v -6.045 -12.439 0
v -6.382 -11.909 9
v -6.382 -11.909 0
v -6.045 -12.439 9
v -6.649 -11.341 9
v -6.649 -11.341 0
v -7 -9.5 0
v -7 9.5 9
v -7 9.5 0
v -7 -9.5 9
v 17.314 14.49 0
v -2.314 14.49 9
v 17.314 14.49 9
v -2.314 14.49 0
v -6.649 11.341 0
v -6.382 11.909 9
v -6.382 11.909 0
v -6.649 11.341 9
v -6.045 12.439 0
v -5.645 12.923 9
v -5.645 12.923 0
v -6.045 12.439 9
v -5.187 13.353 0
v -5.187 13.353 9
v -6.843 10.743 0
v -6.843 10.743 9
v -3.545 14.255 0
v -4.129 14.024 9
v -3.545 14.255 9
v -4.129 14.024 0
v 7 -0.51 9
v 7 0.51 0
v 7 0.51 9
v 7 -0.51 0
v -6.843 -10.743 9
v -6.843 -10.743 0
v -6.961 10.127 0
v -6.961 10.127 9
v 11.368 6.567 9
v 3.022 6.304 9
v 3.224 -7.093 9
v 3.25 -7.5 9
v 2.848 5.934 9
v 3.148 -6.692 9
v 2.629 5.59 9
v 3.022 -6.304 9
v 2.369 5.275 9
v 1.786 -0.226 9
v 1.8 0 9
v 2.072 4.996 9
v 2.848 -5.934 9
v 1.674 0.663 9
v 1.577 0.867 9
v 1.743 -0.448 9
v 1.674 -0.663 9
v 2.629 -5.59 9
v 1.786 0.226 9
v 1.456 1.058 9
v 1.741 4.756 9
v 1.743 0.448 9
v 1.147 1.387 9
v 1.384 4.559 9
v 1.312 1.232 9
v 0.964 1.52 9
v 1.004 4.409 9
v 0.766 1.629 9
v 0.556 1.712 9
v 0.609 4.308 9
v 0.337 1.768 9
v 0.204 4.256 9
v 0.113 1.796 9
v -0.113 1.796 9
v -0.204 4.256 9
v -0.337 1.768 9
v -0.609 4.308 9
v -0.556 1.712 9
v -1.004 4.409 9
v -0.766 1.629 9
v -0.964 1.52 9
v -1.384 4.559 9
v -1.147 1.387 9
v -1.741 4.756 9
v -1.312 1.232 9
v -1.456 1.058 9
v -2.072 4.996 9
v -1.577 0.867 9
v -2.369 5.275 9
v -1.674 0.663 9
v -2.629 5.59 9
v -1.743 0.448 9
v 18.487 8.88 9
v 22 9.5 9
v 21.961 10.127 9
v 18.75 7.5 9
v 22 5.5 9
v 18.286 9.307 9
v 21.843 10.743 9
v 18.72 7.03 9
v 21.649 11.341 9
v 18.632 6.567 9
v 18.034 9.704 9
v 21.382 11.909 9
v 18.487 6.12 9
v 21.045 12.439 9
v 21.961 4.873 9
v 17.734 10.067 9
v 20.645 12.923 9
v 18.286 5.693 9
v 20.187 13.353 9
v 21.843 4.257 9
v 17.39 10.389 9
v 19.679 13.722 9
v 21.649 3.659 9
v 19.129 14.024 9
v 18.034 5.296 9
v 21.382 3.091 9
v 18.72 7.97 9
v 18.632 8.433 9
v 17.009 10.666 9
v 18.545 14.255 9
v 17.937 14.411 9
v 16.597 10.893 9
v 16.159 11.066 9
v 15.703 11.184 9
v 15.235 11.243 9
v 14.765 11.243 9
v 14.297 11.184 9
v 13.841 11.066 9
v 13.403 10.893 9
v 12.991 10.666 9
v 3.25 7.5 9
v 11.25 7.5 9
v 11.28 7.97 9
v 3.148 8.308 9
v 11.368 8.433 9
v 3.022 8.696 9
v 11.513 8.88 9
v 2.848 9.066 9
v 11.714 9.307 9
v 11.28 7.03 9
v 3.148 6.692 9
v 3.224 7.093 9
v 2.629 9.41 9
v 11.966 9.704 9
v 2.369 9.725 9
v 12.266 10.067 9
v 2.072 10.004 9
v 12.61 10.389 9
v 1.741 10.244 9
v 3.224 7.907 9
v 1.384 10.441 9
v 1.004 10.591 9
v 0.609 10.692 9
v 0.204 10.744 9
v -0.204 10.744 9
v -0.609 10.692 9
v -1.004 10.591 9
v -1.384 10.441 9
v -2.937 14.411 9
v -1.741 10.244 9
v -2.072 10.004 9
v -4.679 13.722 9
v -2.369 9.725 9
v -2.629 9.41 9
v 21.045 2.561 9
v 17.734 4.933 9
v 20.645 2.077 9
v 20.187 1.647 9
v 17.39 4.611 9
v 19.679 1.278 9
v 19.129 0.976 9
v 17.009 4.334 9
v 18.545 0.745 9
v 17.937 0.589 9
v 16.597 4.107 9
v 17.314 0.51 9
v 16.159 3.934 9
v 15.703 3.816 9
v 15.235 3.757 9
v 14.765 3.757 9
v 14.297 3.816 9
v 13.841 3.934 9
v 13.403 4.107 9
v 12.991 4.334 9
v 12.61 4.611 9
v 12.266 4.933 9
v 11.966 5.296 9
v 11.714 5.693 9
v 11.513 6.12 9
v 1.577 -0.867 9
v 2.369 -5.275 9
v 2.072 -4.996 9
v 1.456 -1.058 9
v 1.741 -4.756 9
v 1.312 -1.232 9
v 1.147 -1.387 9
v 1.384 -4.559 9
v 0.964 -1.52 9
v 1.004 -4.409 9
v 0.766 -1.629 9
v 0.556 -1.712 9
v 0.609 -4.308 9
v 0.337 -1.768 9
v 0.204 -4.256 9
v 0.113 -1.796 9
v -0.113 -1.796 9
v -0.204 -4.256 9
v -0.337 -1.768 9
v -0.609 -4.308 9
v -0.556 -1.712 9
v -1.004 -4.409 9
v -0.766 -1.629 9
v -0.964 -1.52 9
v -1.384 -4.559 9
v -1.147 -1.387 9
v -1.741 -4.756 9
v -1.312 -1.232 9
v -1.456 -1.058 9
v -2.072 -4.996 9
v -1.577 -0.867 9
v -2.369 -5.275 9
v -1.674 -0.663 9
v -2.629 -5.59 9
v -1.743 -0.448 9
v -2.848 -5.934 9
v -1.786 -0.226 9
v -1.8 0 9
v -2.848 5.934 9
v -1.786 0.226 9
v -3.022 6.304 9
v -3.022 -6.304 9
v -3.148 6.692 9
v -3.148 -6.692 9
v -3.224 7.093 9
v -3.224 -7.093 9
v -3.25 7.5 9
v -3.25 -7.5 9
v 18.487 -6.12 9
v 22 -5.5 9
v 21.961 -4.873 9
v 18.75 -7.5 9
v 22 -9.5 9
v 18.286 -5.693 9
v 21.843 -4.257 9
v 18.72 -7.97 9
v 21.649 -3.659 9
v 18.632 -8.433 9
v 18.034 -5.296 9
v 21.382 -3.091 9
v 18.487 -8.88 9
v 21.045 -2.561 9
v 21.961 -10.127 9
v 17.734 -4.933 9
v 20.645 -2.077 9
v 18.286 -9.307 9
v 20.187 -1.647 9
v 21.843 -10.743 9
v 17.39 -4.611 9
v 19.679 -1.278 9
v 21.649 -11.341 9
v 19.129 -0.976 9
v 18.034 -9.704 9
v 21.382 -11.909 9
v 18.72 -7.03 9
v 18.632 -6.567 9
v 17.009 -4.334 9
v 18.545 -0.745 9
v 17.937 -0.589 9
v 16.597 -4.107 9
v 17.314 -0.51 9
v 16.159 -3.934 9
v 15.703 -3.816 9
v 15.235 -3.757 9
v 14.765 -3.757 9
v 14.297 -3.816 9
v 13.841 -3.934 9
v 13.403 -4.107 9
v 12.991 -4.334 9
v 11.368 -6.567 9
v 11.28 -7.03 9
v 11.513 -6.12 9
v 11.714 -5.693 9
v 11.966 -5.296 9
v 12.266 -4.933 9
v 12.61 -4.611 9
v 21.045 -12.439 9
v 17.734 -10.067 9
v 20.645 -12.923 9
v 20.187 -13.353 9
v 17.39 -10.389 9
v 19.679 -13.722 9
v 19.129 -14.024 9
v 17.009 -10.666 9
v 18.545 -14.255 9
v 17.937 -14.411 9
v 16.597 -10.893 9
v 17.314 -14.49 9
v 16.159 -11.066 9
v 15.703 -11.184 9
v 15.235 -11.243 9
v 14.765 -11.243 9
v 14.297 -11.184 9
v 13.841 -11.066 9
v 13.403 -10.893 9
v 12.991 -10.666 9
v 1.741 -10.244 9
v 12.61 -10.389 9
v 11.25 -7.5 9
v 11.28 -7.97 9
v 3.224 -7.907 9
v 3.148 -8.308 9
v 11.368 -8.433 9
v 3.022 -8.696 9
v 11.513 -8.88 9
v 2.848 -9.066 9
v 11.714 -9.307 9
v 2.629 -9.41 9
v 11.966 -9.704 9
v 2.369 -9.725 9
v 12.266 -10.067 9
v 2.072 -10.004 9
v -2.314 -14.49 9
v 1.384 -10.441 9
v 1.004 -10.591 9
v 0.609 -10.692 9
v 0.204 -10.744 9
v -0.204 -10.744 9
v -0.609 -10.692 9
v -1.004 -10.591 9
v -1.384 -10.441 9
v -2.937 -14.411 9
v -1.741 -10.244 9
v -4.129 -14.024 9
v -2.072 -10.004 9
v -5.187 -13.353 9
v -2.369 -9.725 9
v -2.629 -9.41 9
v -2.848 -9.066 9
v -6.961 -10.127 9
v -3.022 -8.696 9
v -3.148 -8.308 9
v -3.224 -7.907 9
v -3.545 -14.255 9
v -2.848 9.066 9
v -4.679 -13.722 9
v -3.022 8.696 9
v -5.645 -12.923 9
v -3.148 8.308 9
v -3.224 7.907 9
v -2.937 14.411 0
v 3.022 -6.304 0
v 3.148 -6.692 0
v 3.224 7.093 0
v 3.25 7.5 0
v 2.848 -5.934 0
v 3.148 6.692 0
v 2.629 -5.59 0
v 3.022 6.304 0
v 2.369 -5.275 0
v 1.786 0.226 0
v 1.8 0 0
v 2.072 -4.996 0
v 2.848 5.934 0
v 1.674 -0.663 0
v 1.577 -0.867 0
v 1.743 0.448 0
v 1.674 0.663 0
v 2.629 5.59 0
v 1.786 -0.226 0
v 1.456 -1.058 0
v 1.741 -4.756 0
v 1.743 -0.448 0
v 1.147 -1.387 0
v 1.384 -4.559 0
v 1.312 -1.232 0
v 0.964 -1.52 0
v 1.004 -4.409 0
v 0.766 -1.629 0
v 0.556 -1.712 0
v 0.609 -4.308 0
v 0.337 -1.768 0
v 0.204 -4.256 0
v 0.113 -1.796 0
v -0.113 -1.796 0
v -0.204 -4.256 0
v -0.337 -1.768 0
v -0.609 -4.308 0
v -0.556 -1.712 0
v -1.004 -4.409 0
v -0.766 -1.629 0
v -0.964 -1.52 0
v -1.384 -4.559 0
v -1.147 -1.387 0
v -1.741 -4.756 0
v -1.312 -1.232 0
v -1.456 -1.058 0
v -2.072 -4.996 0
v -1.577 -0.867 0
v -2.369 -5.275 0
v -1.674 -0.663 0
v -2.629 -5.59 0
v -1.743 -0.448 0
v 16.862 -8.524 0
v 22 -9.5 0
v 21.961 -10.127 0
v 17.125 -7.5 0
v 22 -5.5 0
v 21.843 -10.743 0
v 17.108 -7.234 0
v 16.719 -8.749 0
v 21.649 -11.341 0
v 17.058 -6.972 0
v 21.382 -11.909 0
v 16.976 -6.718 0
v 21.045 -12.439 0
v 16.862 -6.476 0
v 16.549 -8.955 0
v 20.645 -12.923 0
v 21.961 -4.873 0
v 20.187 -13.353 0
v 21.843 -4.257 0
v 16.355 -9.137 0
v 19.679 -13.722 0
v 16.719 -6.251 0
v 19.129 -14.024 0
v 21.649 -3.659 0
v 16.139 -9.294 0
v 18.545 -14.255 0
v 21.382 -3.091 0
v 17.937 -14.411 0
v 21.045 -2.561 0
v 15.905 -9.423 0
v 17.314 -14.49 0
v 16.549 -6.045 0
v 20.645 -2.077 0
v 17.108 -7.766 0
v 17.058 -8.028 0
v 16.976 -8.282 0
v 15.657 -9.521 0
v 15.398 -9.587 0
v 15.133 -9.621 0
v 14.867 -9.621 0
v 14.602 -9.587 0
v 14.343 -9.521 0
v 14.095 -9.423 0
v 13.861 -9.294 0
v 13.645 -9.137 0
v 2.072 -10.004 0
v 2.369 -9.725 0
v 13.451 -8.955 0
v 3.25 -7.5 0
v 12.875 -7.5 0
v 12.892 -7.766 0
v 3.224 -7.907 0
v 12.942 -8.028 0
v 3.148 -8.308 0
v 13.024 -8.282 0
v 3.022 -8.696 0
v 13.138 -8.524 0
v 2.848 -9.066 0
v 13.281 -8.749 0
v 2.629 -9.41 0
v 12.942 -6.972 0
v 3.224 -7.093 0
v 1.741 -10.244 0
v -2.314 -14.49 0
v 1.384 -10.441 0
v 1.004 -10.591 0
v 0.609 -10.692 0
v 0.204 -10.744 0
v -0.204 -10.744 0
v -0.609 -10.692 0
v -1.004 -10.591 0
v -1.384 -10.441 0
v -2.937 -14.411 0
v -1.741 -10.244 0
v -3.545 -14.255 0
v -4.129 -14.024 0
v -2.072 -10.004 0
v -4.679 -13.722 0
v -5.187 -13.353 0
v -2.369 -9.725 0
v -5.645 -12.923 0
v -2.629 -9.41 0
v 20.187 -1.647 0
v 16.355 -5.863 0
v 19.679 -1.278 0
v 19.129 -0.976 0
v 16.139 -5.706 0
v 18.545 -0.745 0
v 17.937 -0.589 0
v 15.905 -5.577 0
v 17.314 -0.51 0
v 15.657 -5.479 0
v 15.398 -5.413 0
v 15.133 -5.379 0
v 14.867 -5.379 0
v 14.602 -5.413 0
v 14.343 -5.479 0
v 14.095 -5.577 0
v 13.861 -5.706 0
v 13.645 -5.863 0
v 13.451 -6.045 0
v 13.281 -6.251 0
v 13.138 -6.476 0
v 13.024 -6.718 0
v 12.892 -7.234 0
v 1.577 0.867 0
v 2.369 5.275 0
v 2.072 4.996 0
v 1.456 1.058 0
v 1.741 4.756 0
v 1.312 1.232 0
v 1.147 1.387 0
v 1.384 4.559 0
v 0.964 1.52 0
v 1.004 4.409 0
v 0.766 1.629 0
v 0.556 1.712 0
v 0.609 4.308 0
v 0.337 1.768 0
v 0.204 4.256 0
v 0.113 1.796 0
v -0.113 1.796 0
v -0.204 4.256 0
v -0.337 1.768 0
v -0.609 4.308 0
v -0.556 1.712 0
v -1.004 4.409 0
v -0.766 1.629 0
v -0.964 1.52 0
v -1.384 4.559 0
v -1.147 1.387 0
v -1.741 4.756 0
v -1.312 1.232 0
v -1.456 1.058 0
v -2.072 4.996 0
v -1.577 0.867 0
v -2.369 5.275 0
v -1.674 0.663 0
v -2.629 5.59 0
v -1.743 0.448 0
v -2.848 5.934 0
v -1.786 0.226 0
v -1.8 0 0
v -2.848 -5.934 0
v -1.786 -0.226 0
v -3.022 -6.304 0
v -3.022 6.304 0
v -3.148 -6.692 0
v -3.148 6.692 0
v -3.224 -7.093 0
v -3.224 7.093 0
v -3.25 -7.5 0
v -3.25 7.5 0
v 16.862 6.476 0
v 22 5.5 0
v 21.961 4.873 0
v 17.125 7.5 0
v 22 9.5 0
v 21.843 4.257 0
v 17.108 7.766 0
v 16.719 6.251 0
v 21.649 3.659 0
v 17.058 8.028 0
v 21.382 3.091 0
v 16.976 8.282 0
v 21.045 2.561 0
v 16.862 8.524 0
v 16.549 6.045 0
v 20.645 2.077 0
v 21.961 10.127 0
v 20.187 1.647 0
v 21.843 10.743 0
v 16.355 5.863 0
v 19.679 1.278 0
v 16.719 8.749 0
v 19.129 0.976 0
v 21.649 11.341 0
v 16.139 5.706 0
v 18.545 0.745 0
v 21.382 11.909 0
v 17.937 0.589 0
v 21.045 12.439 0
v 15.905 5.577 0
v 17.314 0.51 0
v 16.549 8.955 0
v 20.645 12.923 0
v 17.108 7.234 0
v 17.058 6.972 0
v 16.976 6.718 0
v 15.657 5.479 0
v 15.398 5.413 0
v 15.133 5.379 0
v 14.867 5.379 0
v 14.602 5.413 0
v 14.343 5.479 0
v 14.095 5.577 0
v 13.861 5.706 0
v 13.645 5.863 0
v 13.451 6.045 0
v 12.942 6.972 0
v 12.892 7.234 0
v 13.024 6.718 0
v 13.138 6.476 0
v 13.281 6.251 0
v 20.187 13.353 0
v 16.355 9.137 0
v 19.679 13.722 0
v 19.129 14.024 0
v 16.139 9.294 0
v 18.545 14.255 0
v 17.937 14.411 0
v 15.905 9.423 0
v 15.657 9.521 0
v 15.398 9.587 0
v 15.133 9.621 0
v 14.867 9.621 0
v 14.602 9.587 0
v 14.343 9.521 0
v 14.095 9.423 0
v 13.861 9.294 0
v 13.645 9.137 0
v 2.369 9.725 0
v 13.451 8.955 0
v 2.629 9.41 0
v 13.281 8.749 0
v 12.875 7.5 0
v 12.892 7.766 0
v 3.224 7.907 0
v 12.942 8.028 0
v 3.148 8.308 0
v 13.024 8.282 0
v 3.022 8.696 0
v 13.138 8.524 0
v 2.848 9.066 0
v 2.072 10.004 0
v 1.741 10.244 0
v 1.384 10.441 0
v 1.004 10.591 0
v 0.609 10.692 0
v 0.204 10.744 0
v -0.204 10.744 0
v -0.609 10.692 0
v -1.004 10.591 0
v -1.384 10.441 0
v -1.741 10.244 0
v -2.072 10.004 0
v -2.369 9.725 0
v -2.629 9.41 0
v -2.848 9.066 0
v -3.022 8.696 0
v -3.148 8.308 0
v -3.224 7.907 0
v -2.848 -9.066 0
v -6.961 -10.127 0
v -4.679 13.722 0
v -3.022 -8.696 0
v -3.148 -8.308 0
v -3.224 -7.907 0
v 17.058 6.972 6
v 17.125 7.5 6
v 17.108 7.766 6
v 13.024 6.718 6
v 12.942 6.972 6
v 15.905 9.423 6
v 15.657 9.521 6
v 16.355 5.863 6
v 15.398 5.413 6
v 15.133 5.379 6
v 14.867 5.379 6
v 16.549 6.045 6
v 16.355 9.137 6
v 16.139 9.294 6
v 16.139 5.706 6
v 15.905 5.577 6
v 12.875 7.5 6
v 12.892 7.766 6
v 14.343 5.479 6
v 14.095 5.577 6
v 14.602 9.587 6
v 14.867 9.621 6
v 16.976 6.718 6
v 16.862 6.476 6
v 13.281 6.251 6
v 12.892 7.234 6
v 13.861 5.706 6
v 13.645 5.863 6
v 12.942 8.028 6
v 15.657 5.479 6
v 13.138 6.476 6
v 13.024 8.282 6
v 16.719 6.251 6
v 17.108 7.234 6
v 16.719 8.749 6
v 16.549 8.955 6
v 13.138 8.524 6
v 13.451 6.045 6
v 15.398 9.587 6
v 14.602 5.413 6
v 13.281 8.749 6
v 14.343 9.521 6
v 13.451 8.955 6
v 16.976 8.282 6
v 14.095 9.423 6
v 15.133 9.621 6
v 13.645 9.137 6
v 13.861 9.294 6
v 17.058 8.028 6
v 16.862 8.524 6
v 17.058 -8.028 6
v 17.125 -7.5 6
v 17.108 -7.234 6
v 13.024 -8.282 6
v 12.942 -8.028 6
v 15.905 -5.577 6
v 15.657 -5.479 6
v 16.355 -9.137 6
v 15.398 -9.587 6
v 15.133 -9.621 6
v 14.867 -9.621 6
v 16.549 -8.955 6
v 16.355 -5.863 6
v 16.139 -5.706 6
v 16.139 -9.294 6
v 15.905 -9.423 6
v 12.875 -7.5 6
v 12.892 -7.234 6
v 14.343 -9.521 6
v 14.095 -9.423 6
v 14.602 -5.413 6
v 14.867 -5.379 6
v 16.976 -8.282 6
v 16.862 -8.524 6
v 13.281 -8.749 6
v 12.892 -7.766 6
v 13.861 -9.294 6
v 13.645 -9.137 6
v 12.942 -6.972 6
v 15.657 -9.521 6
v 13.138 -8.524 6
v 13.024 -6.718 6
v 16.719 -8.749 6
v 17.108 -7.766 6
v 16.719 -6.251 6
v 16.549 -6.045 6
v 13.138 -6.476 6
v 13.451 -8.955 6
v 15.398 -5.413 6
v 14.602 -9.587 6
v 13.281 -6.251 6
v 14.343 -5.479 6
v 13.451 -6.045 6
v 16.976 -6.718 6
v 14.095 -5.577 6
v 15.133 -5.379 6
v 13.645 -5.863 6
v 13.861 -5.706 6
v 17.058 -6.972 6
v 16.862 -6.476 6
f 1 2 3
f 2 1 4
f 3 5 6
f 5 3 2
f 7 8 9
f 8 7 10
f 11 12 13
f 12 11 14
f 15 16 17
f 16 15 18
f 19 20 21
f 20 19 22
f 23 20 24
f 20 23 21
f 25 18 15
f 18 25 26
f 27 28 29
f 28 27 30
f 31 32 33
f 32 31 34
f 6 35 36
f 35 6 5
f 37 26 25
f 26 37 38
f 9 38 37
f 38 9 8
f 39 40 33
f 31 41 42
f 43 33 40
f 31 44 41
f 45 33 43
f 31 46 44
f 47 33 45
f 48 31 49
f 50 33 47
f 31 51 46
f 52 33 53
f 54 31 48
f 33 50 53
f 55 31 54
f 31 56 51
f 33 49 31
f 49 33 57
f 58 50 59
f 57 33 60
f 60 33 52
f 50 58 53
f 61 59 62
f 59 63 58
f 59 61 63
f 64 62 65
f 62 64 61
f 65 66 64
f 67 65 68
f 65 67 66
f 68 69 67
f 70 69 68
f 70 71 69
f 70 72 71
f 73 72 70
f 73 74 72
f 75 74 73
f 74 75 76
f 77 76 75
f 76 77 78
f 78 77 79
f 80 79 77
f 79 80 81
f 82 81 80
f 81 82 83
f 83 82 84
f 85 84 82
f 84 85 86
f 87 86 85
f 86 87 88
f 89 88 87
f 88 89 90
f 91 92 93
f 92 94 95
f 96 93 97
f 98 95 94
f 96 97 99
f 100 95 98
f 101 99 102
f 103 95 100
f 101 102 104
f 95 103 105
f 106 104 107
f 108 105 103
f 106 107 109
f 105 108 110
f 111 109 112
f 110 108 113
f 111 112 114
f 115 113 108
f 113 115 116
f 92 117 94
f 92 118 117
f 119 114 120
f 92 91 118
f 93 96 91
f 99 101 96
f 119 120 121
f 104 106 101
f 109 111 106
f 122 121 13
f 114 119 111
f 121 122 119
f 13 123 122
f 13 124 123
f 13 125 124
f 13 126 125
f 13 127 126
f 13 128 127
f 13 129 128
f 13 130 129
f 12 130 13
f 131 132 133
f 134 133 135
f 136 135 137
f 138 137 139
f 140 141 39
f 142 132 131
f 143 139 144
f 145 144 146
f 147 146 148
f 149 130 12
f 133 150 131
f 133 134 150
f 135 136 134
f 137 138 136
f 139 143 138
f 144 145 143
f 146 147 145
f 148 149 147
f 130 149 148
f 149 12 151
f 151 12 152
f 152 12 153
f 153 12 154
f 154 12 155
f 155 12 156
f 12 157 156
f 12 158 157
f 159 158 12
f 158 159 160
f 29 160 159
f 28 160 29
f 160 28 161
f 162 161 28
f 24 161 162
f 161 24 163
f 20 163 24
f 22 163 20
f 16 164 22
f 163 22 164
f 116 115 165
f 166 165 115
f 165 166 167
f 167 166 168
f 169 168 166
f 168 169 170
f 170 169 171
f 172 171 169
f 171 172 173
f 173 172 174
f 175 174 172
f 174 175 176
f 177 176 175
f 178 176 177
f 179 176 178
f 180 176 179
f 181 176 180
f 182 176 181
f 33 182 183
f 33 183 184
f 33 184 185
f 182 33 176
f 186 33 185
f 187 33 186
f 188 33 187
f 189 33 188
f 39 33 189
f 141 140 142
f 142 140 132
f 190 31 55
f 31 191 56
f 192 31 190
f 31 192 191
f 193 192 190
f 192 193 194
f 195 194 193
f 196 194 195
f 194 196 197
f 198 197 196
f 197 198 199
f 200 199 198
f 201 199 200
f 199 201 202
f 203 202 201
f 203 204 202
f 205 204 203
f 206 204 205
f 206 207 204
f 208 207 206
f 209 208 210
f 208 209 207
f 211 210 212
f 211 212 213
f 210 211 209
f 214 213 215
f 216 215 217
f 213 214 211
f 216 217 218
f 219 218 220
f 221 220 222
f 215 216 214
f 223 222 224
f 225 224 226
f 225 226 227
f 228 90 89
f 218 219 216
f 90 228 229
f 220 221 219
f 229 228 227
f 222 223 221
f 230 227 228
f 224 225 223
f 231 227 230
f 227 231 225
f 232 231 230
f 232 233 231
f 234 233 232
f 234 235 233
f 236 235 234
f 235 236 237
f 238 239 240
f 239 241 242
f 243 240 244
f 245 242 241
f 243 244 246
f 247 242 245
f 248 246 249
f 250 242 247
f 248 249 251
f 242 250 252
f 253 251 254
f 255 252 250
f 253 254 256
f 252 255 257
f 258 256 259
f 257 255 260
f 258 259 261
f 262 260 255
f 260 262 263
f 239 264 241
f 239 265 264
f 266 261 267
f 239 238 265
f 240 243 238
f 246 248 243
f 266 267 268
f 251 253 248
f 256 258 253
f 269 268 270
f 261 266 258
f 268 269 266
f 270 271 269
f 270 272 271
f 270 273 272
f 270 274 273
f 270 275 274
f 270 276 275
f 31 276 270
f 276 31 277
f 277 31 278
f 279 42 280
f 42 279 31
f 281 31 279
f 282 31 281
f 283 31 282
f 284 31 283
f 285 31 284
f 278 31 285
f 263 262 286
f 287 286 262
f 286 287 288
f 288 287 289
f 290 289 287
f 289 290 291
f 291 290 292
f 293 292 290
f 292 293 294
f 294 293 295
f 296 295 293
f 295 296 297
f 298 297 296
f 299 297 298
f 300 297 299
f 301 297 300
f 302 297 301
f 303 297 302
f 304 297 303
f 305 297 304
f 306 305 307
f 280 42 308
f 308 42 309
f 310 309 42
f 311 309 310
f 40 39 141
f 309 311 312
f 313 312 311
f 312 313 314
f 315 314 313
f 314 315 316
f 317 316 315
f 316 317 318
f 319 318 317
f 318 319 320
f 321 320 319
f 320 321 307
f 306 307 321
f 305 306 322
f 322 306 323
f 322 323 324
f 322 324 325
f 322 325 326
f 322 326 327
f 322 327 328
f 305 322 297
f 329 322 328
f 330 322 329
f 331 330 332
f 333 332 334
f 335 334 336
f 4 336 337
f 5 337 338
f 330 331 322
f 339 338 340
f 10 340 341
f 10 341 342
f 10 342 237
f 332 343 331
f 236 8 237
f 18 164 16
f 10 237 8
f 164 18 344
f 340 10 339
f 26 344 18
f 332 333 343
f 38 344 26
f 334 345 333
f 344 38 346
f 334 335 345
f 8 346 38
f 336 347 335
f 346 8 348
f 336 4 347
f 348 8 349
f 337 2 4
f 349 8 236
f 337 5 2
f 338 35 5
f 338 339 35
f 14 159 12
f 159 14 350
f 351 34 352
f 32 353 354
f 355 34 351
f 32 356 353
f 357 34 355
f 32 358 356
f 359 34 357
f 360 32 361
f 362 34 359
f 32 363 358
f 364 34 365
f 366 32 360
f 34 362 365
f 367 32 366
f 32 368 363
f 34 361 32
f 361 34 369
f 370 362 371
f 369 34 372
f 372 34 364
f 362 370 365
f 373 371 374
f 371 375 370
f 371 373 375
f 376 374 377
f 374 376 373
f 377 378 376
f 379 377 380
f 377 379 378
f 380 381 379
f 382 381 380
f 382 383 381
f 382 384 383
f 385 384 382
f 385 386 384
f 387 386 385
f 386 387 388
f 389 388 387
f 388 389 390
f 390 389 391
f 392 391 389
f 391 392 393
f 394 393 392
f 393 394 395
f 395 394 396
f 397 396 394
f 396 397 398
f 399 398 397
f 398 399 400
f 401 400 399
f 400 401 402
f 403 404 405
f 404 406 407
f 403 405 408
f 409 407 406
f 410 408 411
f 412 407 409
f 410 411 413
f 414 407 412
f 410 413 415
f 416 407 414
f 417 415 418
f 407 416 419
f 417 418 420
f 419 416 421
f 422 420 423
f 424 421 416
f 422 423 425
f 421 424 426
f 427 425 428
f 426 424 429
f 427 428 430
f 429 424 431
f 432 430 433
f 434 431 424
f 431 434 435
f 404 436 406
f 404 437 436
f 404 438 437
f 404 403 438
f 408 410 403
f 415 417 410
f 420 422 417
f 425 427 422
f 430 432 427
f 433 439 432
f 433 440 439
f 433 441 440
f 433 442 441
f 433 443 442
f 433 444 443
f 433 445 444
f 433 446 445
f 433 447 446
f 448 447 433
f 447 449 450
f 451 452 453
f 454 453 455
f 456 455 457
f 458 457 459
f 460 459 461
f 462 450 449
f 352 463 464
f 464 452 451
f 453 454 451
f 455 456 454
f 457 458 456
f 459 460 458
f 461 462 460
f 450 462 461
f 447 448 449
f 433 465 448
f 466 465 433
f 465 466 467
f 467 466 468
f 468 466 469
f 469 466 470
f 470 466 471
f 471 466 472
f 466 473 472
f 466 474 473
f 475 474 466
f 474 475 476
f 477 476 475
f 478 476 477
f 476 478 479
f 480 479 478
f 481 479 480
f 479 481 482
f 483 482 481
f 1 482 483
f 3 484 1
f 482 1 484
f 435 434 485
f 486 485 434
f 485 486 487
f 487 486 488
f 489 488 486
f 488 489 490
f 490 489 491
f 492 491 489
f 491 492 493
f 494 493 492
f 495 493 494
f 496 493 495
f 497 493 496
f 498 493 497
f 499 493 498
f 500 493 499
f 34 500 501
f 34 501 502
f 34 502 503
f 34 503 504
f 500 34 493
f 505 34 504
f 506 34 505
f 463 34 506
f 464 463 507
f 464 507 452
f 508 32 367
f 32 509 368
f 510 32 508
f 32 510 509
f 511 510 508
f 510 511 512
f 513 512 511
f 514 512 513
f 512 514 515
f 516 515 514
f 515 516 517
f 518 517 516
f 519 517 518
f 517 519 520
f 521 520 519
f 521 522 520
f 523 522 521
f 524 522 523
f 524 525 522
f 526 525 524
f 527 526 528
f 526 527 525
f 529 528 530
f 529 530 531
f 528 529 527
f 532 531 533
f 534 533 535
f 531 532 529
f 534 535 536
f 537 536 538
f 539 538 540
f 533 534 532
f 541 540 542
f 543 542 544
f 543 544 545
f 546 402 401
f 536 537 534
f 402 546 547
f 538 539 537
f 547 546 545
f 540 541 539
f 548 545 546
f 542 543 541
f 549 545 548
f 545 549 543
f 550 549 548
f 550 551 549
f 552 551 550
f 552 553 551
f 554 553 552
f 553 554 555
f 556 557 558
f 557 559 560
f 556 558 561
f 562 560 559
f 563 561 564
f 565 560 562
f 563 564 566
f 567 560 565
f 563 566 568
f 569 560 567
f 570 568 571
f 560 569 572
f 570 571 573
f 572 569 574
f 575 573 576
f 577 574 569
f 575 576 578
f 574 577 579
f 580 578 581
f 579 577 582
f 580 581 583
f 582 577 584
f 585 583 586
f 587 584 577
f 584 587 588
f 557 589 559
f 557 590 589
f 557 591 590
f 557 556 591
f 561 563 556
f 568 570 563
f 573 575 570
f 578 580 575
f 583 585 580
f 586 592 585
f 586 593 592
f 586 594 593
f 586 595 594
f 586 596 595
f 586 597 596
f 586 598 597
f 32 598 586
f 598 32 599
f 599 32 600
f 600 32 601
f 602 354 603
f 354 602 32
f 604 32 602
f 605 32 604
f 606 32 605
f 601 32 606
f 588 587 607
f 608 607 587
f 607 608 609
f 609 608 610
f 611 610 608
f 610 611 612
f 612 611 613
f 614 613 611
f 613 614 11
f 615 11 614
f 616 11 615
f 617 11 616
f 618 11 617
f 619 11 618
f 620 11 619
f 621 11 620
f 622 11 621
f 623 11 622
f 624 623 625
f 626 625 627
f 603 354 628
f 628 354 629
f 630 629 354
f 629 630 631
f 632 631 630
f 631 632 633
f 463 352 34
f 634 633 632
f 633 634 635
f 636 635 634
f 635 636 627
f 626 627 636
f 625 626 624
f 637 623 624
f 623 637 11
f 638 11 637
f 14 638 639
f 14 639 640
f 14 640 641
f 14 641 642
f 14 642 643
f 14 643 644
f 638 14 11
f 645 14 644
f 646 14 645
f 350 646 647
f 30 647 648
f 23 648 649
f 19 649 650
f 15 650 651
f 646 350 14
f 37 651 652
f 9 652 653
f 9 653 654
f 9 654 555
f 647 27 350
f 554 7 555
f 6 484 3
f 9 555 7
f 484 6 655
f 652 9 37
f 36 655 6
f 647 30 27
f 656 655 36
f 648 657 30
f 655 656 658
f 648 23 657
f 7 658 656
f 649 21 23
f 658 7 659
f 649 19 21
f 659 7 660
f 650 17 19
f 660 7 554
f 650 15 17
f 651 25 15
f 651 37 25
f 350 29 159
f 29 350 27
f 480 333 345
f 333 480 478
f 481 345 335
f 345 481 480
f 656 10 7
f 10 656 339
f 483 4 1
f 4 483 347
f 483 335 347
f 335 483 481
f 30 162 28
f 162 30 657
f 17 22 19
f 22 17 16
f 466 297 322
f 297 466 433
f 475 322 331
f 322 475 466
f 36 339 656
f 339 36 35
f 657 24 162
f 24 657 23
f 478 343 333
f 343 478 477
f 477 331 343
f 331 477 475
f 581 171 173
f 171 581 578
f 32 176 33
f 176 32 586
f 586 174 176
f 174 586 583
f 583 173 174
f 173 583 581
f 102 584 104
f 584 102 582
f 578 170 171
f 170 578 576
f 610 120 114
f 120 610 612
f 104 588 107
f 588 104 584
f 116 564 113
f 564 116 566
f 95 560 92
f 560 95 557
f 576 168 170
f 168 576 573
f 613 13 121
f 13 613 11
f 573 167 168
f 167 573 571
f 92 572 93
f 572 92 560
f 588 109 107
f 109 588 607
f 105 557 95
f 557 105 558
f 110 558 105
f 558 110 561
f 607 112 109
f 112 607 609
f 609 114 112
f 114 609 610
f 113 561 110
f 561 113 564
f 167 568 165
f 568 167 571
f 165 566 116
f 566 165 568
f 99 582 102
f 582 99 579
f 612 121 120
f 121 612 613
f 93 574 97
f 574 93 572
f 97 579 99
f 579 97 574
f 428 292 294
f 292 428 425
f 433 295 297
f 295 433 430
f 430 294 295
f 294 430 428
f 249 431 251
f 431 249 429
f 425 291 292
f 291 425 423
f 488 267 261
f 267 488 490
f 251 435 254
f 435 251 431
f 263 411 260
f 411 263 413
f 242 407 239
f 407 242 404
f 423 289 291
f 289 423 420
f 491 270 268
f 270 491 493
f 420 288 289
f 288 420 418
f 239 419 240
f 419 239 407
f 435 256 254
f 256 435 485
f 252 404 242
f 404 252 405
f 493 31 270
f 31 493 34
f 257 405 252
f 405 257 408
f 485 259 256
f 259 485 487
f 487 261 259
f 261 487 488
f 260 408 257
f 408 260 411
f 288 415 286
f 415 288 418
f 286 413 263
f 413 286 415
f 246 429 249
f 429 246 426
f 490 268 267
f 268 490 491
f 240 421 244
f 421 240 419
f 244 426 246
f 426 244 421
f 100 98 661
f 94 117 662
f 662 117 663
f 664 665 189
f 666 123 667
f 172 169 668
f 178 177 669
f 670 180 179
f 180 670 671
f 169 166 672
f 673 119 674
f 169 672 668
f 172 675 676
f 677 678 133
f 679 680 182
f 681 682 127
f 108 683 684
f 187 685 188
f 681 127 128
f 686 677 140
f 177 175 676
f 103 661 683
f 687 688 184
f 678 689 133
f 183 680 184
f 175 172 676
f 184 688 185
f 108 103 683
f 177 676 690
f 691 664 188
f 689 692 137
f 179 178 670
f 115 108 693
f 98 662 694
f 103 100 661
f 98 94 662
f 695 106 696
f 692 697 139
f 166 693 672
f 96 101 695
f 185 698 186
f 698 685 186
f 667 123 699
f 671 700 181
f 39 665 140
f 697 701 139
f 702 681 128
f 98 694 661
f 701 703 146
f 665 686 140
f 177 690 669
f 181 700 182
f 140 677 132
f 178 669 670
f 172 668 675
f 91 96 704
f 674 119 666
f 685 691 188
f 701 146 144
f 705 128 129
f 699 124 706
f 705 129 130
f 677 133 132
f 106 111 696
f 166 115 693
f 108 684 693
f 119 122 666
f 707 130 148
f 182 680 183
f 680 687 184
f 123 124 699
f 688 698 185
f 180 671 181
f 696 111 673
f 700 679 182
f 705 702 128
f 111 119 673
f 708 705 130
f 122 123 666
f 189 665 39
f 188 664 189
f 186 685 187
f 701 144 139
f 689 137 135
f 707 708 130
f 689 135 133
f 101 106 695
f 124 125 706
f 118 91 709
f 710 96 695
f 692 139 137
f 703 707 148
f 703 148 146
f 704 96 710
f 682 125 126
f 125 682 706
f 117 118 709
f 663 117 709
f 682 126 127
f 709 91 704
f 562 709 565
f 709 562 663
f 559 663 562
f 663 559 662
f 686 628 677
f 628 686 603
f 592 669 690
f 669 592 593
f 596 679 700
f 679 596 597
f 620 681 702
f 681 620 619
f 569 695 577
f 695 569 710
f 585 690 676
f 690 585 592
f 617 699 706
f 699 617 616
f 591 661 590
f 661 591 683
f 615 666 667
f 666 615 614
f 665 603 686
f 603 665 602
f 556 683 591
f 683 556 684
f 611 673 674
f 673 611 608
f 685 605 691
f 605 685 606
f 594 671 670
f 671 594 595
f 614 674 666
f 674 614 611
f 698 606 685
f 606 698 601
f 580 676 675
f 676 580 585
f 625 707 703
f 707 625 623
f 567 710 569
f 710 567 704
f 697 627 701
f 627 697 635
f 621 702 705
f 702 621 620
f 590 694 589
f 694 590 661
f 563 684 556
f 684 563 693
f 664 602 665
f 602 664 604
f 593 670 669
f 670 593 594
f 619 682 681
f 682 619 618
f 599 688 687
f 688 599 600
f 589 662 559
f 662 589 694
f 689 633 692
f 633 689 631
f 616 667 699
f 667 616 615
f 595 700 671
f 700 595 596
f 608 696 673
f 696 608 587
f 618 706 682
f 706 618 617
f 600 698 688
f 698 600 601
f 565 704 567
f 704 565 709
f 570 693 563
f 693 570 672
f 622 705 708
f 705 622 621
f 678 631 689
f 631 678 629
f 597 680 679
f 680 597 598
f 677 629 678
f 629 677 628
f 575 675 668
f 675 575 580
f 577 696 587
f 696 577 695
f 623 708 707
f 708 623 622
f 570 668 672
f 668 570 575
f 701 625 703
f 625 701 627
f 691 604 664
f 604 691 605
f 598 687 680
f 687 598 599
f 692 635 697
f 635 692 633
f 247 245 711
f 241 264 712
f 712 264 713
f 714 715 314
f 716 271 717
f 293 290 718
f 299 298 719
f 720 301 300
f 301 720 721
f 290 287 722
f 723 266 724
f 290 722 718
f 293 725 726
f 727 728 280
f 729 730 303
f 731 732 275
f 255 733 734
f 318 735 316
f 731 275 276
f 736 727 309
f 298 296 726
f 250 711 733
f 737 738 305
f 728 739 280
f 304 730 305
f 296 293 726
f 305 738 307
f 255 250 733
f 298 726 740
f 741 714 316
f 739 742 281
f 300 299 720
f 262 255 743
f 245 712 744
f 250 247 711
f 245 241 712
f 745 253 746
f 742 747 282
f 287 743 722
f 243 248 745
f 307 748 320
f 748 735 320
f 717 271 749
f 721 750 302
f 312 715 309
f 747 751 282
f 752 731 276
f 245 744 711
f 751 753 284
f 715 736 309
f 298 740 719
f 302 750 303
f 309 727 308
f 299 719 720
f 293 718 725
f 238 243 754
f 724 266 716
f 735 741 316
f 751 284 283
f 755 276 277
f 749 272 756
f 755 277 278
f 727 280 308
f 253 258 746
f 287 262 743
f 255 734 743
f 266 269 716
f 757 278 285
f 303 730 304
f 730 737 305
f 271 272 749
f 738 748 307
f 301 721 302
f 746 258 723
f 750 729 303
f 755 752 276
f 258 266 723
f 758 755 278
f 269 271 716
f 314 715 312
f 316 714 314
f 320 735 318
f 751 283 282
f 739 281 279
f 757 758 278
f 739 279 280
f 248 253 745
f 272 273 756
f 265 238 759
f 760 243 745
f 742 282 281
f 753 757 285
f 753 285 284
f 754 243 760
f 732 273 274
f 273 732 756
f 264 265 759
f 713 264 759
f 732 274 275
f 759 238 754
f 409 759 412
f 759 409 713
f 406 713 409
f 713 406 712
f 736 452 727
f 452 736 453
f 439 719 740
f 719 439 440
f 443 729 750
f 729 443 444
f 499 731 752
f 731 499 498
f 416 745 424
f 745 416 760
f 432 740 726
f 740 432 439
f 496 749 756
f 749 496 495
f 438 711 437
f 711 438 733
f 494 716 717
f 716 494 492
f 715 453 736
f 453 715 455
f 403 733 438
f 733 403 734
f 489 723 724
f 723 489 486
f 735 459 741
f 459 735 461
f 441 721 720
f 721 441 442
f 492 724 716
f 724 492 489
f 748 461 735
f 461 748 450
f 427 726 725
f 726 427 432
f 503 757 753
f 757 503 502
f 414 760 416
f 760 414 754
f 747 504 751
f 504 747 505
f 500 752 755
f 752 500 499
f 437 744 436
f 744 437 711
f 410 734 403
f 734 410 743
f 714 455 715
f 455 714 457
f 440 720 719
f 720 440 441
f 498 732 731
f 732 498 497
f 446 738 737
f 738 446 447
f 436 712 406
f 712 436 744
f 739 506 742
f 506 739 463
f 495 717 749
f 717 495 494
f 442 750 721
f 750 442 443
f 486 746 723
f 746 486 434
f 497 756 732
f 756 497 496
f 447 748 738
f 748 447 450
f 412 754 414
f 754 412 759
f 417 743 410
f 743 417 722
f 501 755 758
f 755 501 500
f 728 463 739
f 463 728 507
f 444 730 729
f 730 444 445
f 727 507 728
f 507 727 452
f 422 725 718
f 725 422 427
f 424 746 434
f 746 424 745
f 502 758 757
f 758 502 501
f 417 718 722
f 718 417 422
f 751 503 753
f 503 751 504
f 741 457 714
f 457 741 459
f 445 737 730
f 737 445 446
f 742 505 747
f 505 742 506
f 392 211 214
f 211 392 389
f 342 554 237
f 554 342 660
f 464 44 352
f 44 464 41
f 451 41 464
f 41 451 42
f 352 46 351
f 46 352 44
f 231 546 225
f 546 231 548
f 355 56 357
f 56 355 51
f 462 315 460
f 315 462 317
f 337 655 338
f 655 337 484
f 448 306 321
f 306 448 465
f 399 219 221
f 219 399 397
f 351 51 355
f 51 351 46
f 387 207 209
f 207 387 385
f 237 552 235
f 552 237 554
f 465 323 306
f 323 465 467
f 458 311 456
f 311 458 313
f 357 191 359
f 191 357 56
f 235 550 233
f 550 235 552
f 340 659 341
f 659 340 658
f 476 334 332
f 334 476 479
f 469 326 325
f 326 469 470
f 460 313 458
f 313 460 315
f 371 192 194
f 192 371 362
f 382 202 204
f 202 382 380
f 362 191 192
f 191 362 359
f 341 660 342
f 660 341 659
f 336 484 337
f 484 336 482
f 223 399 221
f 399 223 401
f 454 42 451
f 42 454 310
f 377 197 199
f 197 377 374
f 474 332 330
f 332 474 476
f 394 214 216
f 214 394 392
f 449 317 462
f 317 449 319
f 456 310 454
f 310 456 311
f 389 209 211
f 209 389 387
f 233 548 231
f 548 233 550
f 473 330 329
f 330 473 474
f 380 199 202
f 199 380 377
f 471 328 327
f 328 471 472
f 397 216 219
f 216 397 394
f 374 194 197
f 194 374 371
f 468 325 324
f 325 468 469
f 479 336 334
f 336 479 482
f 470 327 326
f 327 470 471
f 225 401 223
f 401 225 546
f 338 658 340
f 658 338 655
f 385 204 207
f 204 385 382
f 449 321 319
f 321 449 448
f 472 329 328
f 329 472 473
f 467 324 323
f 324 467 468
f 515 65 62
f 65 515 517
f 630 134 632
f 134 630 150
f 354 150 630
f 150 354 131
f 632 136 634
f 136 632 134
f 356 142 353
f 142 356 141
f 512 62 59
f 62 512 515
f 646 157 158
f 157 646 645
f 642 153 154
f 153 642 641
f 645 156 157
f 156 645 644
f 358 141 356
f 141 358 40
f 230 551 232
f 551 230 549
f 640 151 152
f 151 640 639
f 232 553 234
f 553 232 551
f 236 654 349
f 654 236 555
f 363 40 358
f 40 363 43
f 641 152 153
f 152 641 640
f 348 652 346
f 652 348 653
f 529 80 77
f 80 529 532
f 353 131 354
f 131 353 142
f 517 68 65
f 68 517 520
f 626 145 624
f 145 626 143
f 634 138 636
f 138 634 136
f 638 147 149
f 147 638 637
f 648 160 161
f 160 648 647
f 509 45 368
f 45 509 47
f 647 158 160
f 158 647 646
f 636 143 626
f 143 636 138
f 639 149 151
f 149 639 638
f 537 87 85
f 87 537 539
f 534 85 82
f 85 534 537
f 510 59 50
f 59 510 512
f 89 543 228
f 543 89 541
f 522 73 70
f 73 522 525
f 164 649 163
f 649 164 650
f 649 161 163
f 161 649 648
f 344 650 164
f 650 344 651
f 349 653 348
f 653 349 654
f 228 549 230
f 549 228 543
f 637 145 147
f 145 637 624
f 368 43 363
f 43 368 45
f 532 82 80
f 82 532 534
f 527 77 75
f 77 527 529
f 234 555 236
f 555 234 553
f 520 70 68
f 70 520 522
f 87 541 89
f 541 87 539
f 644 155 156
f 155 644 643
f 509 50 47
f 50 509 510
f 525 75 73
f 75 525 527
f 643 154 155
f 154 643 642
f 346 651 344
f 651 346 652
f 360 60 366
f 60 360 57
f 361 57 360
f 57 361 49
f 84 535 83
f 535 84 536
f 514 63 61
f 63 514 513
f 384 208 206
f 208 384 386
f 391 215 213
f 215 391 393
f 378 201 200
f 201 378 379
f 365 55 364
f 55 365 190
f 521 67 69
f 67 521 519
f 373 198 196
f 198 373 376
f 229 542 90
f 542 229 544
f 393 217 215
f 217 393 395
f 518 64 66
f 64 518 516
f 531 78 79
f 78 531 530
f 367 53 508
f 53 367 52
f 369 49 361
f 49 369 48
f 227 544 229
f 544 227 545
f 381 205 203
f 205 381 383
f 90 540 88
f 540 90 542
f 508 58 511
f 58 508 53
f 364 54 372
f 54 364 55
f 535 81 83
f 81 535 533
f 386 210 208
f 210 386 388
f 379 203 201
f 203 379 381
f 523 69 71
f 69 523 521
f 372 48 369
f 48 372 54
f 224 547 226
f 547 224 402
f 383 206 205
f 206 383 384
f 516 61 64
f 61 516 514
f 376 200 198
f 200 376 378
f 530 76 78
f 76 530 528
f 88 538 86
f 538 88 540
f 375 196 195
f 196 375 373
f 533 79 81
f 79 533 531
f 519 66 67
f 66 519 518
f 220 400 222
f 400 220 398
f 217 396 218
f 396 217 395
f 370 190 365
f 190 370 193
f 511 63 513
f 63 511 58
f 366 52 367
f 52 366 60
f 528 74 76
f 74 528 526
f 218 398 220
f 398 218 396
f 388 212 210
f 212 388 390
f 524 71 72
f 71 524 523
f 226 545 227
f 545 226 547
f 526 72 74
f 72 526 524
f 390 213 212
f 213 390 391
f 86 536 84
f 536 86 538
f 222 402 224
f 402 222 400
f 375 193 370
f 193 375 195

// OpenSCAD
$fn = 50;


difference() {
	union() {
		hull() {
			translate(v = [-2.0000000000, 9.5000000000, 0]) {
				cylinder(h = 9, r = 5);
			}
			translate(v = [2.0000000000, 9.5000000000, 0]) {
				cylinder(h = 9, r = 5);
			}
			translate(v = [-2.0000000000, -9.5000000000, 0]) {
				cylinder(h = 9, r = 5);
			}
			translate(v = [2.0000000000, -9.5000000000, 0]) {
				cylinder(h = 9, r = 5);
			}
		}
		translate(v = [7.5000000000, 7.5000000000, 0]) {
			hull() {
				translate(v = [-9.5000000000, 2.0000000000, 0]) {
					cylinder(h = 9, r = 5);
				}
				translate(v = [9.5000000000, 2.0000000000, 0]) {
					cylinder(h = 9, r = 5);
				}
				translate(v = [-9.5000000000, -2.0000000000, 0]) {
					cylinder(h = 9, r = 5);
				}
				translate(v = [9.5000000000, -2.0000000000, 0]) {
					cylinder(h = 9, r = 5);
				}
			}
		}
		translate(v = [7.5000000000, -7.5000000000, 0]) {
			hull() {
				translate(v = [-9.5000000000, 2.0000000000, 0]) {
					cylinder(h = 9, r = 5);
				}
				translate(v = [9.5000000000, 2.0000000000, 0]) {
					cylinder(h = 9, r = 5);
				}
				translate(v = [-9.5000000000, -2.0000000000, 0]) {
					cylinder(h = 9, r = 5);
				}
				translate(v = [9.5000000000, -2.0000000000, 0]) {
					cylinder(h = 9, r = 5);
				}
			}
		}
	}
	union() {
		translate(v = [15.0000000000, 7.5000000000, 9]) {
			rotate(a = [0, 0, 0]) {
				difference() {
					union() {
						#translate(v = [0, 0, -9.0000000000]) {
							cylinder(h = 9, r = 2.0000000000);
						}
						#translate(v = [0, 0, -3]) {
							cylinder(h = 3, r1 = 2.1250000000, r2 = 3.7500000000);
						}
						#translate(v = [0, 0, -9.0000000000]) {
							cylinder(h = 9, r = 2.1250000000);
						}
						#translate(v = [0, 0, -9.0000000000]) {
							cylinder(h = 9, r = 2.0000000000);
						}
					}
					union();
				}
			}
		}
		translate(v = [15.0000000000, -7.5000000000, 9]) {
			rotate(a = [0, 0, 0]) {
				difference() {
					union() {
						#translate(v = [0, 0, -9.0000000000]) {
							cylinder(h = 9, r = 2.0000000000);
						}
						#translate(v = [0, 0, -3]) {
							cylinder(h = 3, r1 = 2.1250000000, r2 = 3.7500000000);
						}
						#translate(v = [0, 0, -9.0000000000]) {
							cylinder(h = 9, r = 2.1250000000);
						}
						#translate(v = [0, 0, -9.0000000000]) {
							cylinder(h = 9, r = 2.0000000000);
						}
					}
					union();
				}
			}
		}
		translate(v = [0.0000000000, -7.5000000000, 0]) {
			translate(v = [0, 0, -100]) {
				cylinder(h = 200, r = 3.2500000000);
			}
		}
		translate(v = [0.0000000000, 7.5000000000, 0]) {
			translate(v = [0, 0, -100]) {
				cylinder(h = 200, r = 3.2500000000);
			}
		}
		translate(v = [0.0000000000, -7.5000000000, 0]) {
			translate(v = [0, 0, -100]) {
				cylinder(h = 200, r = 1.8000000000);
			}
		}
		translate(v = [0, 0, -100]) {
			cylinder(h = 200, r = 1.8000000000);
		}
		translate(v = [0.0000000000, 7.5000000000, 0]) {
			translate(v = [0, 0, -100]) {
				cylinder(h = 200, r = 1.8000000000);
			}
		}
	}
}
